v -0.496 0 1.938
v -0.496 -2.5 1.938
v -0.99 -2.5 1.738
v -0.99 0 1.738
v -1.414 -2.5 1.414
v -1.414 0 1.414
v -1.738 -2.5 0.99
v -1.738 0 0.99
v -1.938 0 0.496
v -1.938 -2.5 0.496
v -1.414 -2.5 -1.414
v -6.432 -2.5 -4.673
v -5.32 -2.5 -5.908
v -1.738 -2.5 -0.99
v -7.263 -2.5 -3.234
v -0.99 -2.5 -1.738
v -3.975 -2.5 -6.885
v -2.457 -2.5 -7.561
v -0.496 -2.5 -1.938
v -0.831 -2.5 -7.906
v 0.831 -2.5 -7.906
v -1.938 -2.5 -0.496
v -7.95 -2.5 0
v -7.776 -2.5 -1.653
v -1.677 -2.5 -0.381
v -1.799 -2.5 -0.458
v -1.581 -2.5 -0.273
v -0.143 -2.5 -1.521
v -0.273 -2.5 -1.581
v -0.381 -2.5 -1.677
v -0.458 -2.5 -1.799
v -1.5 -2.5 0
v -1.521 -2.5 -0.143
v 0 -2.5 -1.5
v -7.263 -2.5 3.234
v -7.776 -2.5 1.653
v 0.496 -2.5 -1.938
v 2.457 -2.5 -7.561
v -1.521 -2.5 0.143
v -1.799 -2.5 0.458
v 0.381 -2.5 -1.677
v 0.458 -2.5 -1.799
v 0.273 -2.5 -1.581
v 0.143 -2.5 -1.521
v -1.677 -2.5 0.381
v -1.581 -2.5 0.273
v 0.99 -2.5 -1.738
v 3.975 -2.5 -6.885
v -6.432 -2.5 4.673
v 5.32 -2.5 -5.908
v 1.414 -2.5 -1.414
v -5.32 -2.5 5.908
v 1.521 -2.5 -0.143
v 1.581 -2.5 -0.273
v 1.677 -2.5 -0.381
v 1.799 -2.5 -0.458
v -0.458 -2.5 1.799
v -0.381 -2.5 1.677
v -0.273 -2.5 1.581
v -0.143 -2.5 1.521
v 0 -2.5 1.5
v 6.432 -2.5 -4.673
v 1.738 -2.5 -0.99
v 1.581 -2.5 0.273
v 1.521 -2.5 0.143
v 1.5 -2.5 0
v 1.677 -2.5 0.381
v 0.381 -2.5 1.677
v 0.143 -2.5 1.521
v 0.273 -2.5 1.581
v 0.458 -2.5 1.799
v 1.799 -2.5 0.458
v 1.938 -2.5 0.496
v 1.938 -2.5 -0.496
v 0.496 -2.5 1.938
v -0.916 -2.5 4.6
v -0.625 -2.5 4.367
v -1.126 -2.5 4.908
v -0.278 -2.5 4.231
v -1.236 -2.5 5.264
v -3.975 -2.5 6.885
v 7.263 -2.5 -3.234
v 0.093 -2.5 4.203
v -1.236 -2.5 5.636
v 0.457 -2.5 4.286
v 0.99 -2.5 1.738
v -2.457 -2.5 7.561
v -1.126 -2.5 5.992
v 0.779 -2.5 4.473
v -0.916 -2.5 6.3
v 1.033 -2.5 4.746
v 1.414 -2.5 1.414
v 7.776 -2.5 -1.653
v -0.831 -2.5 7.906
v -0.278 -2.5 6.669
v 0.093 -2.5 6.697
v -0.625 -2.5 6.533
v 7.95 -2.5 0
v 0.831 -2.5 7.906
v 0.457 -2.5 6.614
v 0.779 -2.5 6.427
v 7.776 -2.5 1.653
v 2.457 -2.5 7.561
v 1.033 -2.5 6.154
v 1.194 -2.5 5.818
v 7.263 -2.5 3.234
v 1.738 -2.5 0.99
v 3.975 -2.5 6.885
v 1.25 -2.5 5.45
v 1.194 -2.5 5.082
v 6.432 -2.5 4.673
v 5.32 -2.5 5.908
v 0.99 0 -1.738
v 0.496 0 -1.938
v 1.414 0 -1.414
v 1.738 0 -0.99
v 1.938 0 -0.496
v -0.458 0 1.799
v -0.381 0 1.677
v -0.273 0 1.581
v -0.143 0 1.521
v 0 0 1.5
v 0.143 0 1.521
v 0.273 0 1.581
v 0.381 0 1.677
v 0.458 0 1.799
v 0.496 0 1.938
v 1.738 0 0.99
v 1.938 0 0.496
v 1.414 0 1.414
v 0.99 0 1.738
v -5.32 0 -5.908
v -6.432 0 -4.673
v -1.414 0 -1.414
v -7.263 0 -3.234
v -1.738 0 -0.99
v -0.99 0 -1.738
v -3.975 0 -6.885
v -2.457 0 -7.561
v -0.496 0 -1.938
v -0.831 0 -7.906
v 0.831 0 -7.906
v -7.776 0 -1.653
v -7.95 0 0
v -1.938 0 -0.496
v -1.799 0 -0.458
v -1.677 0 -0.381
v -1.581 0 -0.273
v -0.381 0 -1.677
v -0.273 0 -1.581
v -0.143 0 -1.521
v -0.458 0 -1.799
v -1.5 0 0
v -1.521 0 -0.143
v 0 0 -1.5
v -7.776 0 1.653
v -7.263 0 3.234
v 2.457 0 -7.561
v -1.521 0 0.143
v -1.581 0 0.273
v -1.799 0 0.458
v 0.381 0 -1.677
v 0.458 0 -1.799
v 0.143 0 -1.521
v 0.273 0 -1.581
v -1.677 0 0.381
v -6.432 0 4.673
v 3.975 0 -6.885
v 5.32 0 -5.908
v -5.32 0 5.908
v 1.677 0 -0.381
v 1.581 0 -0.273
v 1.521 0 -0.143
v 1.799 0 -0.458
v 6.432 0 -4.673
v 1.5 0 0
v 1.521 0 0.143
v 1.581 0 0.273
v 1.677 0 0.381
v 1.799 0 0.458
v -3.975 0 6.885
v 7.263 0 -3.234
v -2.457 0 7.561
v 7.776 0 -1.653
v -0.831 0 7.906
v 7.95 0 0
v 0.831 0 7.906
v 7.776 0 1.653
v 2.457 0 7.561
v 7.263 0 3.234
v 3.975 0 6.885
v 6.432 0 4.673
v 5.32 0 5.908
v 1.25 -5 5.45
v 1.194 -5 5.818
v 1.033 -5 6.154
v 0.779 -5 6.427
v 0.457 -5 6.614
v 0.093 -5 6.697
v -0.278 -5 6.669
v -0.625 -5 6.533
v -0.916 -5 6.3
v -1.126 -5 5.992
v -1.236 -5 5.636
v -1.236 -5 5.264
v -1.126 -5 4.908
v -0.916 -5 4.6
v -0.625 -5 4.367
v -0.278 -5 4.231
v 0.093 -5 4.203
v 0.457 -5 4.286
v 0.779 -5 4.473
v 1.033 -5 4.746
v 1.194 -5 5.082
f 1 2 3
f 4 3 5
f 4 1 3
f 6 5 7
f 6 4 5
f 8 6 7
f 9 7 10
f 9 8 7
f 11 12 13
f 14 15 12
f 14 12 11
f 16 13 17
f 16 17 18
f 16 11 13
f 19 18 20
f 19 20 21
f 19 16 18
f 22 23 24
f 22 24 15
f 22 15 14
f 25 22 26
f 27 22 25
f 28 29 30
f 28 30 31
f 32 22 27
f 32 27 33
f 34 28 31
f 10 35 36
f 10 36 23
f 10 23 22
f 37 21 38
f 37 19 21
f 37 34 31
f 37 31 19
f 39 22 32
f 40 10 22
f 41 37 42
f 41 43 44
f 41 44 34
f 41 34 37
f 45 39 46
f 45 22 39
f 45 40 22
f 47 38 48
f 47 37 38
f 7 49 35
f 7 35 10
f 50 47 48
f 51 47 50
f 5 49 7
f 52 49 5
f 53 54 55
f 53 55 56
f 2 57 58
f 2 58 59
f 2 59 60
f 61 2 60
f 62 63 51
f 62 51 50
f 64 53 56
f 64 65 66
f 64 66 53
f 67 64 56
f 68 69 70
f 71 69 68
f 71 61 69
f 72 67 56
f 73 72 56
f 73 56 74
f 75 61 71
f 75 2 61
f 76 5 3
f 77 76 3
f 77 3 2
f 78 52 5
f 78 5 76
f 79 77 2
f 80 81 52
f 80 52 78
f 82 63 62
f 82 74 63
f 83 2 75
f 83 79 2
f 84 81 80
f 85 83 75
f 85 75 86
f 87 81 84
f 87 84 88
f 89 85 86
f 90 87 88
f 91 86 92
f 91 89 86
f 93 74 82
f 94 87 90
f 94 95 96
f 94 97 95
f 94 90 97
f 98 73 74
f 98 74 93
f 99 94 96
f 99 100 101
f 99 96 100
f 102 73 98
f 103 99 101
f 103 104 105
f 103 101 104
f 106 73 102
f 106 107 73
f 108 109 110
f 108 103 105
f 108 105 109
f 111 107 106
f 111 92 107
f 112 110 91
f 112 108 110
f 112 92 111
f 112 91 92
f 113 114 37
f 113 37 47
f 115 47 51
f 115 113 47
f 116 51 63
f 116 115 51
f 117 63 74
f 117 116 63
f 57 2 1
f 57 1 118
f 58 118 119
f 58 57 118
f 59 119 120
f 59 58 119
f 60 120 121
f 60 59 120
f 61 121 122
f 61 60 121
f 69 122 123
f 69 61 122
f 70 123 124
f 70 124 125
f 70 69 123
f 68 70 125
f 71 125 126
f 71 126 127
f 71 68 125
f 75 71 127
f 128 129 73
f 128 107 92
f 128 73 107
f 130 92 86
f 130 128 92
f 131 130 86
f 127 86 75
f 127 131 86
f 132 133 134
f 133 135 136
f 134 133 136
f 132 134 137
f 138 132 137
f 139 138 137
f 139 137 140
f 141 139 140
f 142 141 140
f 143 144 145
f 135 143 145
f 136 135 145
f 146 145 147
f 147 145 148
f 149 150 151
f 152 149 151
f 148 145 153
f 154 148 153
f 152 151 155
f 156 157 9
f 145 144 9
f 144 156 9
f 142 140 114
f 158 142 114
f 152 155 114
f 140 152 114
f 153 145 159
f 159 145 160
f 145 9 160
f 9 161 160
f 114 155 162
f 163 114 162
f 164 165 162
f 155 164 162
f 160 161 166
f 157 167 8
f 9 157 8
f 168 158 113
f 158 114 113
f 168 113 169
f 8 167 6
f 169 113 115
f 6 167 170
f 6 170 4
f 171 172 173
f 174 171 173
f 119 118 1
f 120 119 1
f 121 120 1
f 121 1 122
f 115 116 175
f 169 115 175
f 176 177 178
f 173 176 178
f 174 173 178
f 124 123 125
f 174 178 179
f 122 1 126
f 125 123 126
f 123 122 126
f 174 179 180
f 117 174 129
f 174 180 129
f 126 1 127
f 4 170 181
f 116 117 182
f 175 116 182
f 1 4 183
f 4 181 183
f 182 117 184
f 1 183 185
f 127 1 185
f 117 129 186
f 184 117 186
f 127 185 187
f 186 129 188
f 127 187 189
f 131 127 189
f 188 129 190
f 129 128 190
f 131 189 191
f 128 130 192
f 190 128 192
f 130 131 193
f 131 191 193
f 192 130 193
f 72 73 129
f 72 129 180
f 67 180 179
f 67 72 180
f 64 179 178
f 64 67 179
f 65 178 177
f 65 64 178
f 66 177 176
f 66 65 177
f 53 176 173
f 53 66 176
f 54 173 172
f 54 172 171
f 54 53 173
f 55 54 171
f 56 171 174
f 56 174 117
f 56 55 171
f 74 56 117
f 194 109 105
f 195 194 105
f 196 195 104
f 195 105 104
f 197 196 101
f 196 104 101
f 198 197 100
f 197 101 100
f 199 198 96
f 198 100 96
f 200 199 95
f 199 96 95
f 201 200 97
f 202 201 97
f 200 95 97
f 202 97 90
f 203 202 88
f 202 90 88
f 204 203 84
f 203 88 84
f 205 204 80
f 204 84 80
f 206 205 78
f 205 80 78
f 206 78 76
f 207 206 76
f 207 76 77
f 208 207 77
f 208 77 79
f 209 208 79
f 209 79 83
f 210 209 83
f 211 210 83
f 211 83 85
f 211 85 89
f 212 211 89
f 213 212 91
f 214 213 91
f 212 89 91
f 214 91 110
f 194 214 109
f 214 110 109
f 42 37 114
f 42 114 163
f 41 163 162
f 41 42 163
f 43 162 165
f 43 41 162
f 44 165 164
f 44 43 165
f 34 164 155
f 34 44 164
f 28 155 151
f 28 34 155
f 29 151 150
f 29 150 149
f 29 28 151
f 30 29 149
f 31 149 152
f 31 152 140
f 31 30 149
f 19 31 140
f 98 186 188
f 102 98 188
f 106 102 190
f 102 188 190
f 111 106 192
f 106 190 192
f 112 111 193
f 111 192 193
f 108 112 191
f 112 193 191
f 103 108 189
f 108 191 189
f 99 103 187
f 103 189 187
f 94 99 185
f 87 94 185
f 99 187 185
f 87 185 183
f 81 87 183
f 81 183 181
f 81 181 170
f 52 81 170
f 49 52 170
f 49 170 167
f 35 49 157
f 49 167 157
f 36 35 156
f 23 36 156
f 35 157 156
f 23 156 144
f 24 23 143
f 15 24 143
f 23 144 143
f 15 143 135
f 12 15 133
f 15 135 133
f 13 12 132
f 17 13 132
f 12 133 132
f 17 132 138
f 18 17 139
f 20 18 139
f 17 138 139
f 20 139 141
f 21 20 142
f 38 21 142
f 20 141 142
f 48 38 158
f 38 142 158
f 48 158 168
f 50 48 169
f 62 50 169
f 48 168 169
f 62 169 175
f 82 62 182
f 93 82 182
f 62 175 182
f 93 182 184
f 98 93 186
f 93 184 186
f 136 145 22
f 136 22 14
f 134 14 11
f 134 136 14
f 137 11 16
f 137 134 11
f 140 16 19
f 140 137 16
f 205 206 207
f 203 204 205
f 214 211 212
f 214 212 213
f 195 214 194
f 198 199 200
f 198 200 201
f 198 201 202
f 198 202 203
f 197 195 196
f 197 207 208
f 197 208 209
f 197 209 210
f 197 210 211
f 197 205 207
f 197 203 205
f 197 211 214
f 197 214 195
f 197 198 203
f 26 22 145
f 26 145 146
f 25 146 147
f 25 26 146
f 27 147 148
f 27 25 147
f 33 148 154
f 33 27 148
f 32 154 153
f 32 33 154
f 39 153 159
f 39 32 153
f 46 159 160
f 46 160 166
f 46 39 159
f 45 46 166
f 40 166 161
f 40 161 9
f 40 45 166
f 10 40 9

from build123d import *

# Parameters (mm, degrees)
F0_R            = 7.95
F0_R_2          = 2
F1_DEPTH        = 2.5
F2_R            = 1.25
F3_DEPTH        = 2.5
F5_DEPTH        = 2.5
F5_COPIES_COUNT = 4


# Not quite as in the source:
# - a pattern or mirror of a feature is missing from the dataset's text; its kind, count and spacing are read off the source's solid


with BuildPart() as f1:
    # F0 (on Front) → F1 (new body)
    with BuildSketch(Plane.XZ):
        Circle(F0_R)
        Circle(F0_R_2, mode=Mode.SUBTRACT)
    extrude(amount=F1_DEPTH)

    # F2 (on face) → F3 (join)
    with BuildSketch(Plane.XZ.offset(2.5)):
        with Locations((0, 5.45)):
            Circle(F2_R)
    extrude(amount=F3_DEPTH)

    # F4 (on face) → F5 (join, through all)
    with BuildSketch(Plane.XZ.offset(2.5)):
        with BuildLine():
            ThreePointArc((-0.4960783708, 1.9375), (0, 1.5), (0.4960783708, 1.9375))
            ThreePointArc((0.4960783708, 1.9375), (0, 2), (-0.4960783708, 1.9375))
        make_face()
    f5 = extrude(amount=-F5_DEPTH)

    # F5_copies: F5 ×4 about axis
    f5_copies_axis = Axis((0, 0, 0), (0, 1, 0))
    for i in range(1, F5_COPIES_COUNT):
        add(f5.rotate(f5_copies_axis, i * 360 / F5_COPIES_COUNT))


solid = f1.part
